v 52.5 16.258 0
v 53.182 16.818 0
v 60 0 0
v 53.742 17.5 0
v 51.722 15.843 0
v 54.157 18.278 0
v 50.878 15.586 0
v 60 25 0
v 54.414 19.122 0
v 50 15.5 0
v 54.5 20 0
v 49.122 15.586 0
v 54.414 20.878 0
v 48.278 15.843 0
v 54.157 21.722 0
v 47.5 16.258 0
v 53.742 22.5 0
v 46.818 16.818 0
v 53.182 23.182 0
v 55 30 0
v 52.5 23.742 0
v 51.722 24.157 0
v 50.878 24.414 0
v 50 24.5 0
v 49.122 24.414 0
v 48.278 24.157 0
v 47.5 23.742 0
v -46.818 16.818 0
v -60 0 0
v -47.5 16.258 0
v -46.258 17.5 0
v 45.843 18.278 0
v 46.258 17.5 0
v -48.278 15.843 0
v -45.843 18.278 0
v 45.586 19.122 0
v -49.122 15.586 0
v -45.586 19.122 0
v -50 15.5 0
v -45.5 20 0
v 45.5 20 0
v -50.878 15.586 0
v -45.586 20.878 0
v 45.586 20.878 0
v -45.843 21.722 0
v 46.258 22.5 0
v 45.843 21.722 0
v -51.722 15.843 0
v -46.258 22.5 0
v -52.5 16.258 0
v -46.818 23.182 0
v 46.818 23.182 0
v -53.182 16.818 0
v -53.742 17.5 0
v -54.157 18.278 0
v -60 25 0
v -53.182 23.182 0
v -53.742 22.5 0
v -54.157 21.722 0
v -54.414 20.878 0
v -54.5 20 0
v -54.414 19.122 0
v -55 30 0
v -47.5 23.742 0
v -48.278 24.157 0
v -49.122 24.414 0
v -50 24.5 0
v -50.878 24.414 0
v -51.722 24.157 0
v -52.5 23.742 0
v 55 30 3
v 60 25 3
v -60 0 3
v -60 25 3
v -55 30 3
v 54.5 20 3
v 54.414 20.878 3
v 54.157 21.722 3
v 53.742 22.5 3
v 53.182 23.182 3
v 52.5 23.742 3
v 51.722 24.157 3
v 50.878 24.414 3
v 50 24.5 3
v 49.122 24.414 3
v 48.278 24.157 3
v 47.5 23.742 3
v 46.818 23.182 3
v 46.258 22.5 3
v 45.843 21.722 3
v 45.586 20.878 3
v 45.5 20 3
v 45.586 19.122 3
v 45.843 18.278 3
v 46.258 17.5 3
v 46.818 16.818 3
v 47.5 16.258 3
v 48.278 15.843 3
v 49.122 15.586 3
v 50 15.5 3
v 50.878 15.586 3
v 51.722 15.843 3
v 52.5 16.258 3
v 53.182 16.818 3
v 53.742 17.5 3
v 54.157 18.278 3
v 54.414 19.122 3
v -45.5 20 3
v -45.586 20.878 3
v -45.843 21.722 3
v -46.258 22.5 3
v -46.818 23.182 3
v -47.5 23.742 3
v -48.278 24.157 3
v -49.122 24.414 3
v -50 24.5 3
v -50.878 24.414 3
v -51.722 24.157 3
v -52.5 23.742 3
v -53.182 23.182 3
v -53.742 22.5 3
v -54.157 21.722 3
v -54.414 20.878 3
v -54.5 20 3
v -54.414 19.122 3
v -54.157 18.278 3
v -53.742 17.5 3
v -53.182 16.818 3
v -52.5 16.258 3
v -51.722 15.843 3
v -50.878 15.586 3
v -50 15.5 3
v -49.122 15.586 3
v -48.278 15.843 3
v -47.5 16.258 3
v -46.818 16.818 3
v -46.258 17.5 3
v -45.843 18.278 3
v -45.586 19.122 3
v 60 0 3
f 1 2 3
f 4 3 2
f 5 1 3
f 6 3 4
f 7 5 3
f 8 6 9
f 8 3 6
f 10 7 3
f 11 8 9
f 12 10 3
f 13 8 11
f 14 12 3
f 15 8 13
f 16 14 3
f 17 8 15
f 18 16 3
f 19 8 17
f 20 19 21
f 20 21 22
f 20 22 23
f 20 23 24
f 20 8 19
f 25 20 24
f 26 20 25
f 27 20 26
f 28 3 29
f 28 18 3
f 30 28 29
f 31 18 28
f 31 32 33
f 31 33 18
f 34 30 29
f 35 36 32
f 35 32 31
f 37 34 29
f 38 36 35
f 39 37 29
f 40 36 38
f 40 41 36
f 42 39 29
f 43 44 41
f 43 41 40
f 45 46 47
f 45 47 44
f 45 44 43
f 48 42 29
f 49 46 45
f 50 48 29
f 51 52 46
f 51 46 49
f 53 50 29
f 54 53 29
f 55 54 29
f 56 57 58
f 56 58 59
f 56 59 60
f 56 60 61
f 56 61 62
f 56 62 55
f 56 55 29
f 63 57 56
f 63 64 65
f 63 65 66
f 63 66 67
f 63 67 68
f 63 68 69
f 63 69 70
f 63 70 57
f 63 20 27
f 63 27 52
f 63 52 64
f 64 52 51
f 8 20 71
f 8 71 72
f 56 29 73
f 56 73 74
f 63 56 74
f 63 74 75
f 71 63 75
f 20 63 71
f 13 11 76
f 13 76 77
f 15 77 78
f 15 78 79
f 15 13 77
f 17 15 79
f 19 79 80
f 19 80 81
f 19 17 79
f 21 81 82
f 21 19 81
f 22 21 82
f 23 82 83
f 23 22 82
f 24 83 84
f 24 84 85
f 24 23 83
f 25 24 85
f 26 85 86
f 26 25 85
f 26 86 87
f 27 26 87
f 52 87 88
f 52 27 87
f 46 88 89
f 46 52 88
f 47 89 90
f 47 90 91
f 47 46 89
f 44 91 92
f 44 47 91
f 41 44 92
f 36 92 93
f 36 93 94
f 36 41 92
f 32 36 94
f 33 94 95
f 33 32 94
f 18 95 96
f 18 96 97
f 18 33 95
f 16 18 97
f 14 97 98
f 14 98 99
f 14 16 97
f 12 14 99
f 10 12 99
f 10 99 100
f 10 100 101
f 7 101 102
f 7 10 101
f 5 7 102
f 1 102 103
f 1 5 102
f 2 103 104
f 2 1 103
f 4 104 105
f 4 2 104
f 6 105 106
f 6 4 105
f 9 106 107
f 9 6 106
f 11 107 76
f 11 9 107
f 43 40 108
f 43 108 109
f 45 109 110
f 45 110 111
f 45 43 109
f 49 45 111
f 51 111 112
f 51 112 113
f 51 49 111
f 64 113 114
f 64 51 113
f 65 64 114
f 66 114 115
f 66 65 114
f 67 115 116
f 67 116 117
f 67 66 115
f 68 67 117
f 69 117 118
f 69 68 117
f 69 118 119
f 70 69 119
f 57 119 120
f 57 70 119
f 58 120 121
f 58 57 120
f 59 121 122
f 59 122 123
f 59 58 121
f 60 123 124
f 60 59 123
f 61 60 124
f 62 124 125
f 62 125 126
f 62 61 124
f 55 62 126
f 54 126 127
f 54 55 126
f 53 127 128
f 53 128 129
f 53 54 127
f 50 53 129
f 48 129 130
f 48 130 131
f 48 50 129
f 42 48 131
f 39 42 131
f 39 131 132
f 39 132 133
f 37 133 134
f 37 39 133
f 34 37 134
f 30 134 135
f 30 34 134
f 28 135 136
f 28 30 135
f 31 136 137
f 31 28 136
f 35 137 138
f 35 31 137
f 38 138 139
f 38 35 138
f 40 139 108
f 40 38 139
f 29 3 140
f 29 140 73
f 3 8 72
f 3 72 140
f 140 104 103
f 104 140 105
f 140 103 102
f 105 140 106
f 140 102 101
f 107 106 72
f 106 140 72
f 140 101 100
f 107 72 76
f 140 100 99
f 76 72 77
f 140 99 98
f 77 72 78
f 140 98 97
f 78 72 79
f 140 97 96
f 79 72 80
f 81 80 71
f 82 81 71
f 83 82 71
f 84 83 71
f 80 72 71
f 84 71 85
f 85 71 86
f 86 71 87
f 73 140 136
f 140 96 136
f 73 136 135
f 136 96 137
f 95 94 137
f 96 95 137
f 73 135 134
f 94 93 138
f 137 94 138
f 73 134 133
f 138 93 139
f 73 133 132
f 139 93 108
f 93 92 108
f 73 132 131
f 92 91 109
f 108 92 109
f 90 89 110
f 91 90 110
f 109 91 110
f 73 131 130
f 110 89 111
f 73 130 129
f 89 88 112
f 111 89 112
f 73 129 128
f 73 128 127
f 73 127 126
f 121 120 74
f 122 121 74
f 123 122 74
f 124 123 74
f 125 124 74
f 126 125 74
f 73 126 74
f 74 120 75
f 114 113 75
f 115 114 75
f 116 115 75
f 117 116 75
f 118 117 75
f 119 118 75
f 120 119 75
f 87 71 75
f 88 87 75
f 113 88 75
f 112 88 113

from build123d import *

# Parameters (mm, degrees)
CROQUIS1_R              = 4.5
SALIENTE_EXTRUIR1_DEPTH = 3


with BuildPart() as part:
    # Croquis1 → Saliente-Extruir1 (new body)
    with BuildSketch(Plane.XY):
        Polygon((-60, 25), (-55, 30), (55, 30), (60, 25), (60, 0), (-60, 0), align=None)
        with Locations((-50, 20)):
            Circle(CROQUIS1_R, mode=Mode.SUBTRACT)
        with Locations((50, 20)):
            Circle(CROQUIS1_R, mode=Mode.SUBTRACT)
    extrude(amount=SALIENTE_EXTRUIR1_DEPTH)


solid = part.part
